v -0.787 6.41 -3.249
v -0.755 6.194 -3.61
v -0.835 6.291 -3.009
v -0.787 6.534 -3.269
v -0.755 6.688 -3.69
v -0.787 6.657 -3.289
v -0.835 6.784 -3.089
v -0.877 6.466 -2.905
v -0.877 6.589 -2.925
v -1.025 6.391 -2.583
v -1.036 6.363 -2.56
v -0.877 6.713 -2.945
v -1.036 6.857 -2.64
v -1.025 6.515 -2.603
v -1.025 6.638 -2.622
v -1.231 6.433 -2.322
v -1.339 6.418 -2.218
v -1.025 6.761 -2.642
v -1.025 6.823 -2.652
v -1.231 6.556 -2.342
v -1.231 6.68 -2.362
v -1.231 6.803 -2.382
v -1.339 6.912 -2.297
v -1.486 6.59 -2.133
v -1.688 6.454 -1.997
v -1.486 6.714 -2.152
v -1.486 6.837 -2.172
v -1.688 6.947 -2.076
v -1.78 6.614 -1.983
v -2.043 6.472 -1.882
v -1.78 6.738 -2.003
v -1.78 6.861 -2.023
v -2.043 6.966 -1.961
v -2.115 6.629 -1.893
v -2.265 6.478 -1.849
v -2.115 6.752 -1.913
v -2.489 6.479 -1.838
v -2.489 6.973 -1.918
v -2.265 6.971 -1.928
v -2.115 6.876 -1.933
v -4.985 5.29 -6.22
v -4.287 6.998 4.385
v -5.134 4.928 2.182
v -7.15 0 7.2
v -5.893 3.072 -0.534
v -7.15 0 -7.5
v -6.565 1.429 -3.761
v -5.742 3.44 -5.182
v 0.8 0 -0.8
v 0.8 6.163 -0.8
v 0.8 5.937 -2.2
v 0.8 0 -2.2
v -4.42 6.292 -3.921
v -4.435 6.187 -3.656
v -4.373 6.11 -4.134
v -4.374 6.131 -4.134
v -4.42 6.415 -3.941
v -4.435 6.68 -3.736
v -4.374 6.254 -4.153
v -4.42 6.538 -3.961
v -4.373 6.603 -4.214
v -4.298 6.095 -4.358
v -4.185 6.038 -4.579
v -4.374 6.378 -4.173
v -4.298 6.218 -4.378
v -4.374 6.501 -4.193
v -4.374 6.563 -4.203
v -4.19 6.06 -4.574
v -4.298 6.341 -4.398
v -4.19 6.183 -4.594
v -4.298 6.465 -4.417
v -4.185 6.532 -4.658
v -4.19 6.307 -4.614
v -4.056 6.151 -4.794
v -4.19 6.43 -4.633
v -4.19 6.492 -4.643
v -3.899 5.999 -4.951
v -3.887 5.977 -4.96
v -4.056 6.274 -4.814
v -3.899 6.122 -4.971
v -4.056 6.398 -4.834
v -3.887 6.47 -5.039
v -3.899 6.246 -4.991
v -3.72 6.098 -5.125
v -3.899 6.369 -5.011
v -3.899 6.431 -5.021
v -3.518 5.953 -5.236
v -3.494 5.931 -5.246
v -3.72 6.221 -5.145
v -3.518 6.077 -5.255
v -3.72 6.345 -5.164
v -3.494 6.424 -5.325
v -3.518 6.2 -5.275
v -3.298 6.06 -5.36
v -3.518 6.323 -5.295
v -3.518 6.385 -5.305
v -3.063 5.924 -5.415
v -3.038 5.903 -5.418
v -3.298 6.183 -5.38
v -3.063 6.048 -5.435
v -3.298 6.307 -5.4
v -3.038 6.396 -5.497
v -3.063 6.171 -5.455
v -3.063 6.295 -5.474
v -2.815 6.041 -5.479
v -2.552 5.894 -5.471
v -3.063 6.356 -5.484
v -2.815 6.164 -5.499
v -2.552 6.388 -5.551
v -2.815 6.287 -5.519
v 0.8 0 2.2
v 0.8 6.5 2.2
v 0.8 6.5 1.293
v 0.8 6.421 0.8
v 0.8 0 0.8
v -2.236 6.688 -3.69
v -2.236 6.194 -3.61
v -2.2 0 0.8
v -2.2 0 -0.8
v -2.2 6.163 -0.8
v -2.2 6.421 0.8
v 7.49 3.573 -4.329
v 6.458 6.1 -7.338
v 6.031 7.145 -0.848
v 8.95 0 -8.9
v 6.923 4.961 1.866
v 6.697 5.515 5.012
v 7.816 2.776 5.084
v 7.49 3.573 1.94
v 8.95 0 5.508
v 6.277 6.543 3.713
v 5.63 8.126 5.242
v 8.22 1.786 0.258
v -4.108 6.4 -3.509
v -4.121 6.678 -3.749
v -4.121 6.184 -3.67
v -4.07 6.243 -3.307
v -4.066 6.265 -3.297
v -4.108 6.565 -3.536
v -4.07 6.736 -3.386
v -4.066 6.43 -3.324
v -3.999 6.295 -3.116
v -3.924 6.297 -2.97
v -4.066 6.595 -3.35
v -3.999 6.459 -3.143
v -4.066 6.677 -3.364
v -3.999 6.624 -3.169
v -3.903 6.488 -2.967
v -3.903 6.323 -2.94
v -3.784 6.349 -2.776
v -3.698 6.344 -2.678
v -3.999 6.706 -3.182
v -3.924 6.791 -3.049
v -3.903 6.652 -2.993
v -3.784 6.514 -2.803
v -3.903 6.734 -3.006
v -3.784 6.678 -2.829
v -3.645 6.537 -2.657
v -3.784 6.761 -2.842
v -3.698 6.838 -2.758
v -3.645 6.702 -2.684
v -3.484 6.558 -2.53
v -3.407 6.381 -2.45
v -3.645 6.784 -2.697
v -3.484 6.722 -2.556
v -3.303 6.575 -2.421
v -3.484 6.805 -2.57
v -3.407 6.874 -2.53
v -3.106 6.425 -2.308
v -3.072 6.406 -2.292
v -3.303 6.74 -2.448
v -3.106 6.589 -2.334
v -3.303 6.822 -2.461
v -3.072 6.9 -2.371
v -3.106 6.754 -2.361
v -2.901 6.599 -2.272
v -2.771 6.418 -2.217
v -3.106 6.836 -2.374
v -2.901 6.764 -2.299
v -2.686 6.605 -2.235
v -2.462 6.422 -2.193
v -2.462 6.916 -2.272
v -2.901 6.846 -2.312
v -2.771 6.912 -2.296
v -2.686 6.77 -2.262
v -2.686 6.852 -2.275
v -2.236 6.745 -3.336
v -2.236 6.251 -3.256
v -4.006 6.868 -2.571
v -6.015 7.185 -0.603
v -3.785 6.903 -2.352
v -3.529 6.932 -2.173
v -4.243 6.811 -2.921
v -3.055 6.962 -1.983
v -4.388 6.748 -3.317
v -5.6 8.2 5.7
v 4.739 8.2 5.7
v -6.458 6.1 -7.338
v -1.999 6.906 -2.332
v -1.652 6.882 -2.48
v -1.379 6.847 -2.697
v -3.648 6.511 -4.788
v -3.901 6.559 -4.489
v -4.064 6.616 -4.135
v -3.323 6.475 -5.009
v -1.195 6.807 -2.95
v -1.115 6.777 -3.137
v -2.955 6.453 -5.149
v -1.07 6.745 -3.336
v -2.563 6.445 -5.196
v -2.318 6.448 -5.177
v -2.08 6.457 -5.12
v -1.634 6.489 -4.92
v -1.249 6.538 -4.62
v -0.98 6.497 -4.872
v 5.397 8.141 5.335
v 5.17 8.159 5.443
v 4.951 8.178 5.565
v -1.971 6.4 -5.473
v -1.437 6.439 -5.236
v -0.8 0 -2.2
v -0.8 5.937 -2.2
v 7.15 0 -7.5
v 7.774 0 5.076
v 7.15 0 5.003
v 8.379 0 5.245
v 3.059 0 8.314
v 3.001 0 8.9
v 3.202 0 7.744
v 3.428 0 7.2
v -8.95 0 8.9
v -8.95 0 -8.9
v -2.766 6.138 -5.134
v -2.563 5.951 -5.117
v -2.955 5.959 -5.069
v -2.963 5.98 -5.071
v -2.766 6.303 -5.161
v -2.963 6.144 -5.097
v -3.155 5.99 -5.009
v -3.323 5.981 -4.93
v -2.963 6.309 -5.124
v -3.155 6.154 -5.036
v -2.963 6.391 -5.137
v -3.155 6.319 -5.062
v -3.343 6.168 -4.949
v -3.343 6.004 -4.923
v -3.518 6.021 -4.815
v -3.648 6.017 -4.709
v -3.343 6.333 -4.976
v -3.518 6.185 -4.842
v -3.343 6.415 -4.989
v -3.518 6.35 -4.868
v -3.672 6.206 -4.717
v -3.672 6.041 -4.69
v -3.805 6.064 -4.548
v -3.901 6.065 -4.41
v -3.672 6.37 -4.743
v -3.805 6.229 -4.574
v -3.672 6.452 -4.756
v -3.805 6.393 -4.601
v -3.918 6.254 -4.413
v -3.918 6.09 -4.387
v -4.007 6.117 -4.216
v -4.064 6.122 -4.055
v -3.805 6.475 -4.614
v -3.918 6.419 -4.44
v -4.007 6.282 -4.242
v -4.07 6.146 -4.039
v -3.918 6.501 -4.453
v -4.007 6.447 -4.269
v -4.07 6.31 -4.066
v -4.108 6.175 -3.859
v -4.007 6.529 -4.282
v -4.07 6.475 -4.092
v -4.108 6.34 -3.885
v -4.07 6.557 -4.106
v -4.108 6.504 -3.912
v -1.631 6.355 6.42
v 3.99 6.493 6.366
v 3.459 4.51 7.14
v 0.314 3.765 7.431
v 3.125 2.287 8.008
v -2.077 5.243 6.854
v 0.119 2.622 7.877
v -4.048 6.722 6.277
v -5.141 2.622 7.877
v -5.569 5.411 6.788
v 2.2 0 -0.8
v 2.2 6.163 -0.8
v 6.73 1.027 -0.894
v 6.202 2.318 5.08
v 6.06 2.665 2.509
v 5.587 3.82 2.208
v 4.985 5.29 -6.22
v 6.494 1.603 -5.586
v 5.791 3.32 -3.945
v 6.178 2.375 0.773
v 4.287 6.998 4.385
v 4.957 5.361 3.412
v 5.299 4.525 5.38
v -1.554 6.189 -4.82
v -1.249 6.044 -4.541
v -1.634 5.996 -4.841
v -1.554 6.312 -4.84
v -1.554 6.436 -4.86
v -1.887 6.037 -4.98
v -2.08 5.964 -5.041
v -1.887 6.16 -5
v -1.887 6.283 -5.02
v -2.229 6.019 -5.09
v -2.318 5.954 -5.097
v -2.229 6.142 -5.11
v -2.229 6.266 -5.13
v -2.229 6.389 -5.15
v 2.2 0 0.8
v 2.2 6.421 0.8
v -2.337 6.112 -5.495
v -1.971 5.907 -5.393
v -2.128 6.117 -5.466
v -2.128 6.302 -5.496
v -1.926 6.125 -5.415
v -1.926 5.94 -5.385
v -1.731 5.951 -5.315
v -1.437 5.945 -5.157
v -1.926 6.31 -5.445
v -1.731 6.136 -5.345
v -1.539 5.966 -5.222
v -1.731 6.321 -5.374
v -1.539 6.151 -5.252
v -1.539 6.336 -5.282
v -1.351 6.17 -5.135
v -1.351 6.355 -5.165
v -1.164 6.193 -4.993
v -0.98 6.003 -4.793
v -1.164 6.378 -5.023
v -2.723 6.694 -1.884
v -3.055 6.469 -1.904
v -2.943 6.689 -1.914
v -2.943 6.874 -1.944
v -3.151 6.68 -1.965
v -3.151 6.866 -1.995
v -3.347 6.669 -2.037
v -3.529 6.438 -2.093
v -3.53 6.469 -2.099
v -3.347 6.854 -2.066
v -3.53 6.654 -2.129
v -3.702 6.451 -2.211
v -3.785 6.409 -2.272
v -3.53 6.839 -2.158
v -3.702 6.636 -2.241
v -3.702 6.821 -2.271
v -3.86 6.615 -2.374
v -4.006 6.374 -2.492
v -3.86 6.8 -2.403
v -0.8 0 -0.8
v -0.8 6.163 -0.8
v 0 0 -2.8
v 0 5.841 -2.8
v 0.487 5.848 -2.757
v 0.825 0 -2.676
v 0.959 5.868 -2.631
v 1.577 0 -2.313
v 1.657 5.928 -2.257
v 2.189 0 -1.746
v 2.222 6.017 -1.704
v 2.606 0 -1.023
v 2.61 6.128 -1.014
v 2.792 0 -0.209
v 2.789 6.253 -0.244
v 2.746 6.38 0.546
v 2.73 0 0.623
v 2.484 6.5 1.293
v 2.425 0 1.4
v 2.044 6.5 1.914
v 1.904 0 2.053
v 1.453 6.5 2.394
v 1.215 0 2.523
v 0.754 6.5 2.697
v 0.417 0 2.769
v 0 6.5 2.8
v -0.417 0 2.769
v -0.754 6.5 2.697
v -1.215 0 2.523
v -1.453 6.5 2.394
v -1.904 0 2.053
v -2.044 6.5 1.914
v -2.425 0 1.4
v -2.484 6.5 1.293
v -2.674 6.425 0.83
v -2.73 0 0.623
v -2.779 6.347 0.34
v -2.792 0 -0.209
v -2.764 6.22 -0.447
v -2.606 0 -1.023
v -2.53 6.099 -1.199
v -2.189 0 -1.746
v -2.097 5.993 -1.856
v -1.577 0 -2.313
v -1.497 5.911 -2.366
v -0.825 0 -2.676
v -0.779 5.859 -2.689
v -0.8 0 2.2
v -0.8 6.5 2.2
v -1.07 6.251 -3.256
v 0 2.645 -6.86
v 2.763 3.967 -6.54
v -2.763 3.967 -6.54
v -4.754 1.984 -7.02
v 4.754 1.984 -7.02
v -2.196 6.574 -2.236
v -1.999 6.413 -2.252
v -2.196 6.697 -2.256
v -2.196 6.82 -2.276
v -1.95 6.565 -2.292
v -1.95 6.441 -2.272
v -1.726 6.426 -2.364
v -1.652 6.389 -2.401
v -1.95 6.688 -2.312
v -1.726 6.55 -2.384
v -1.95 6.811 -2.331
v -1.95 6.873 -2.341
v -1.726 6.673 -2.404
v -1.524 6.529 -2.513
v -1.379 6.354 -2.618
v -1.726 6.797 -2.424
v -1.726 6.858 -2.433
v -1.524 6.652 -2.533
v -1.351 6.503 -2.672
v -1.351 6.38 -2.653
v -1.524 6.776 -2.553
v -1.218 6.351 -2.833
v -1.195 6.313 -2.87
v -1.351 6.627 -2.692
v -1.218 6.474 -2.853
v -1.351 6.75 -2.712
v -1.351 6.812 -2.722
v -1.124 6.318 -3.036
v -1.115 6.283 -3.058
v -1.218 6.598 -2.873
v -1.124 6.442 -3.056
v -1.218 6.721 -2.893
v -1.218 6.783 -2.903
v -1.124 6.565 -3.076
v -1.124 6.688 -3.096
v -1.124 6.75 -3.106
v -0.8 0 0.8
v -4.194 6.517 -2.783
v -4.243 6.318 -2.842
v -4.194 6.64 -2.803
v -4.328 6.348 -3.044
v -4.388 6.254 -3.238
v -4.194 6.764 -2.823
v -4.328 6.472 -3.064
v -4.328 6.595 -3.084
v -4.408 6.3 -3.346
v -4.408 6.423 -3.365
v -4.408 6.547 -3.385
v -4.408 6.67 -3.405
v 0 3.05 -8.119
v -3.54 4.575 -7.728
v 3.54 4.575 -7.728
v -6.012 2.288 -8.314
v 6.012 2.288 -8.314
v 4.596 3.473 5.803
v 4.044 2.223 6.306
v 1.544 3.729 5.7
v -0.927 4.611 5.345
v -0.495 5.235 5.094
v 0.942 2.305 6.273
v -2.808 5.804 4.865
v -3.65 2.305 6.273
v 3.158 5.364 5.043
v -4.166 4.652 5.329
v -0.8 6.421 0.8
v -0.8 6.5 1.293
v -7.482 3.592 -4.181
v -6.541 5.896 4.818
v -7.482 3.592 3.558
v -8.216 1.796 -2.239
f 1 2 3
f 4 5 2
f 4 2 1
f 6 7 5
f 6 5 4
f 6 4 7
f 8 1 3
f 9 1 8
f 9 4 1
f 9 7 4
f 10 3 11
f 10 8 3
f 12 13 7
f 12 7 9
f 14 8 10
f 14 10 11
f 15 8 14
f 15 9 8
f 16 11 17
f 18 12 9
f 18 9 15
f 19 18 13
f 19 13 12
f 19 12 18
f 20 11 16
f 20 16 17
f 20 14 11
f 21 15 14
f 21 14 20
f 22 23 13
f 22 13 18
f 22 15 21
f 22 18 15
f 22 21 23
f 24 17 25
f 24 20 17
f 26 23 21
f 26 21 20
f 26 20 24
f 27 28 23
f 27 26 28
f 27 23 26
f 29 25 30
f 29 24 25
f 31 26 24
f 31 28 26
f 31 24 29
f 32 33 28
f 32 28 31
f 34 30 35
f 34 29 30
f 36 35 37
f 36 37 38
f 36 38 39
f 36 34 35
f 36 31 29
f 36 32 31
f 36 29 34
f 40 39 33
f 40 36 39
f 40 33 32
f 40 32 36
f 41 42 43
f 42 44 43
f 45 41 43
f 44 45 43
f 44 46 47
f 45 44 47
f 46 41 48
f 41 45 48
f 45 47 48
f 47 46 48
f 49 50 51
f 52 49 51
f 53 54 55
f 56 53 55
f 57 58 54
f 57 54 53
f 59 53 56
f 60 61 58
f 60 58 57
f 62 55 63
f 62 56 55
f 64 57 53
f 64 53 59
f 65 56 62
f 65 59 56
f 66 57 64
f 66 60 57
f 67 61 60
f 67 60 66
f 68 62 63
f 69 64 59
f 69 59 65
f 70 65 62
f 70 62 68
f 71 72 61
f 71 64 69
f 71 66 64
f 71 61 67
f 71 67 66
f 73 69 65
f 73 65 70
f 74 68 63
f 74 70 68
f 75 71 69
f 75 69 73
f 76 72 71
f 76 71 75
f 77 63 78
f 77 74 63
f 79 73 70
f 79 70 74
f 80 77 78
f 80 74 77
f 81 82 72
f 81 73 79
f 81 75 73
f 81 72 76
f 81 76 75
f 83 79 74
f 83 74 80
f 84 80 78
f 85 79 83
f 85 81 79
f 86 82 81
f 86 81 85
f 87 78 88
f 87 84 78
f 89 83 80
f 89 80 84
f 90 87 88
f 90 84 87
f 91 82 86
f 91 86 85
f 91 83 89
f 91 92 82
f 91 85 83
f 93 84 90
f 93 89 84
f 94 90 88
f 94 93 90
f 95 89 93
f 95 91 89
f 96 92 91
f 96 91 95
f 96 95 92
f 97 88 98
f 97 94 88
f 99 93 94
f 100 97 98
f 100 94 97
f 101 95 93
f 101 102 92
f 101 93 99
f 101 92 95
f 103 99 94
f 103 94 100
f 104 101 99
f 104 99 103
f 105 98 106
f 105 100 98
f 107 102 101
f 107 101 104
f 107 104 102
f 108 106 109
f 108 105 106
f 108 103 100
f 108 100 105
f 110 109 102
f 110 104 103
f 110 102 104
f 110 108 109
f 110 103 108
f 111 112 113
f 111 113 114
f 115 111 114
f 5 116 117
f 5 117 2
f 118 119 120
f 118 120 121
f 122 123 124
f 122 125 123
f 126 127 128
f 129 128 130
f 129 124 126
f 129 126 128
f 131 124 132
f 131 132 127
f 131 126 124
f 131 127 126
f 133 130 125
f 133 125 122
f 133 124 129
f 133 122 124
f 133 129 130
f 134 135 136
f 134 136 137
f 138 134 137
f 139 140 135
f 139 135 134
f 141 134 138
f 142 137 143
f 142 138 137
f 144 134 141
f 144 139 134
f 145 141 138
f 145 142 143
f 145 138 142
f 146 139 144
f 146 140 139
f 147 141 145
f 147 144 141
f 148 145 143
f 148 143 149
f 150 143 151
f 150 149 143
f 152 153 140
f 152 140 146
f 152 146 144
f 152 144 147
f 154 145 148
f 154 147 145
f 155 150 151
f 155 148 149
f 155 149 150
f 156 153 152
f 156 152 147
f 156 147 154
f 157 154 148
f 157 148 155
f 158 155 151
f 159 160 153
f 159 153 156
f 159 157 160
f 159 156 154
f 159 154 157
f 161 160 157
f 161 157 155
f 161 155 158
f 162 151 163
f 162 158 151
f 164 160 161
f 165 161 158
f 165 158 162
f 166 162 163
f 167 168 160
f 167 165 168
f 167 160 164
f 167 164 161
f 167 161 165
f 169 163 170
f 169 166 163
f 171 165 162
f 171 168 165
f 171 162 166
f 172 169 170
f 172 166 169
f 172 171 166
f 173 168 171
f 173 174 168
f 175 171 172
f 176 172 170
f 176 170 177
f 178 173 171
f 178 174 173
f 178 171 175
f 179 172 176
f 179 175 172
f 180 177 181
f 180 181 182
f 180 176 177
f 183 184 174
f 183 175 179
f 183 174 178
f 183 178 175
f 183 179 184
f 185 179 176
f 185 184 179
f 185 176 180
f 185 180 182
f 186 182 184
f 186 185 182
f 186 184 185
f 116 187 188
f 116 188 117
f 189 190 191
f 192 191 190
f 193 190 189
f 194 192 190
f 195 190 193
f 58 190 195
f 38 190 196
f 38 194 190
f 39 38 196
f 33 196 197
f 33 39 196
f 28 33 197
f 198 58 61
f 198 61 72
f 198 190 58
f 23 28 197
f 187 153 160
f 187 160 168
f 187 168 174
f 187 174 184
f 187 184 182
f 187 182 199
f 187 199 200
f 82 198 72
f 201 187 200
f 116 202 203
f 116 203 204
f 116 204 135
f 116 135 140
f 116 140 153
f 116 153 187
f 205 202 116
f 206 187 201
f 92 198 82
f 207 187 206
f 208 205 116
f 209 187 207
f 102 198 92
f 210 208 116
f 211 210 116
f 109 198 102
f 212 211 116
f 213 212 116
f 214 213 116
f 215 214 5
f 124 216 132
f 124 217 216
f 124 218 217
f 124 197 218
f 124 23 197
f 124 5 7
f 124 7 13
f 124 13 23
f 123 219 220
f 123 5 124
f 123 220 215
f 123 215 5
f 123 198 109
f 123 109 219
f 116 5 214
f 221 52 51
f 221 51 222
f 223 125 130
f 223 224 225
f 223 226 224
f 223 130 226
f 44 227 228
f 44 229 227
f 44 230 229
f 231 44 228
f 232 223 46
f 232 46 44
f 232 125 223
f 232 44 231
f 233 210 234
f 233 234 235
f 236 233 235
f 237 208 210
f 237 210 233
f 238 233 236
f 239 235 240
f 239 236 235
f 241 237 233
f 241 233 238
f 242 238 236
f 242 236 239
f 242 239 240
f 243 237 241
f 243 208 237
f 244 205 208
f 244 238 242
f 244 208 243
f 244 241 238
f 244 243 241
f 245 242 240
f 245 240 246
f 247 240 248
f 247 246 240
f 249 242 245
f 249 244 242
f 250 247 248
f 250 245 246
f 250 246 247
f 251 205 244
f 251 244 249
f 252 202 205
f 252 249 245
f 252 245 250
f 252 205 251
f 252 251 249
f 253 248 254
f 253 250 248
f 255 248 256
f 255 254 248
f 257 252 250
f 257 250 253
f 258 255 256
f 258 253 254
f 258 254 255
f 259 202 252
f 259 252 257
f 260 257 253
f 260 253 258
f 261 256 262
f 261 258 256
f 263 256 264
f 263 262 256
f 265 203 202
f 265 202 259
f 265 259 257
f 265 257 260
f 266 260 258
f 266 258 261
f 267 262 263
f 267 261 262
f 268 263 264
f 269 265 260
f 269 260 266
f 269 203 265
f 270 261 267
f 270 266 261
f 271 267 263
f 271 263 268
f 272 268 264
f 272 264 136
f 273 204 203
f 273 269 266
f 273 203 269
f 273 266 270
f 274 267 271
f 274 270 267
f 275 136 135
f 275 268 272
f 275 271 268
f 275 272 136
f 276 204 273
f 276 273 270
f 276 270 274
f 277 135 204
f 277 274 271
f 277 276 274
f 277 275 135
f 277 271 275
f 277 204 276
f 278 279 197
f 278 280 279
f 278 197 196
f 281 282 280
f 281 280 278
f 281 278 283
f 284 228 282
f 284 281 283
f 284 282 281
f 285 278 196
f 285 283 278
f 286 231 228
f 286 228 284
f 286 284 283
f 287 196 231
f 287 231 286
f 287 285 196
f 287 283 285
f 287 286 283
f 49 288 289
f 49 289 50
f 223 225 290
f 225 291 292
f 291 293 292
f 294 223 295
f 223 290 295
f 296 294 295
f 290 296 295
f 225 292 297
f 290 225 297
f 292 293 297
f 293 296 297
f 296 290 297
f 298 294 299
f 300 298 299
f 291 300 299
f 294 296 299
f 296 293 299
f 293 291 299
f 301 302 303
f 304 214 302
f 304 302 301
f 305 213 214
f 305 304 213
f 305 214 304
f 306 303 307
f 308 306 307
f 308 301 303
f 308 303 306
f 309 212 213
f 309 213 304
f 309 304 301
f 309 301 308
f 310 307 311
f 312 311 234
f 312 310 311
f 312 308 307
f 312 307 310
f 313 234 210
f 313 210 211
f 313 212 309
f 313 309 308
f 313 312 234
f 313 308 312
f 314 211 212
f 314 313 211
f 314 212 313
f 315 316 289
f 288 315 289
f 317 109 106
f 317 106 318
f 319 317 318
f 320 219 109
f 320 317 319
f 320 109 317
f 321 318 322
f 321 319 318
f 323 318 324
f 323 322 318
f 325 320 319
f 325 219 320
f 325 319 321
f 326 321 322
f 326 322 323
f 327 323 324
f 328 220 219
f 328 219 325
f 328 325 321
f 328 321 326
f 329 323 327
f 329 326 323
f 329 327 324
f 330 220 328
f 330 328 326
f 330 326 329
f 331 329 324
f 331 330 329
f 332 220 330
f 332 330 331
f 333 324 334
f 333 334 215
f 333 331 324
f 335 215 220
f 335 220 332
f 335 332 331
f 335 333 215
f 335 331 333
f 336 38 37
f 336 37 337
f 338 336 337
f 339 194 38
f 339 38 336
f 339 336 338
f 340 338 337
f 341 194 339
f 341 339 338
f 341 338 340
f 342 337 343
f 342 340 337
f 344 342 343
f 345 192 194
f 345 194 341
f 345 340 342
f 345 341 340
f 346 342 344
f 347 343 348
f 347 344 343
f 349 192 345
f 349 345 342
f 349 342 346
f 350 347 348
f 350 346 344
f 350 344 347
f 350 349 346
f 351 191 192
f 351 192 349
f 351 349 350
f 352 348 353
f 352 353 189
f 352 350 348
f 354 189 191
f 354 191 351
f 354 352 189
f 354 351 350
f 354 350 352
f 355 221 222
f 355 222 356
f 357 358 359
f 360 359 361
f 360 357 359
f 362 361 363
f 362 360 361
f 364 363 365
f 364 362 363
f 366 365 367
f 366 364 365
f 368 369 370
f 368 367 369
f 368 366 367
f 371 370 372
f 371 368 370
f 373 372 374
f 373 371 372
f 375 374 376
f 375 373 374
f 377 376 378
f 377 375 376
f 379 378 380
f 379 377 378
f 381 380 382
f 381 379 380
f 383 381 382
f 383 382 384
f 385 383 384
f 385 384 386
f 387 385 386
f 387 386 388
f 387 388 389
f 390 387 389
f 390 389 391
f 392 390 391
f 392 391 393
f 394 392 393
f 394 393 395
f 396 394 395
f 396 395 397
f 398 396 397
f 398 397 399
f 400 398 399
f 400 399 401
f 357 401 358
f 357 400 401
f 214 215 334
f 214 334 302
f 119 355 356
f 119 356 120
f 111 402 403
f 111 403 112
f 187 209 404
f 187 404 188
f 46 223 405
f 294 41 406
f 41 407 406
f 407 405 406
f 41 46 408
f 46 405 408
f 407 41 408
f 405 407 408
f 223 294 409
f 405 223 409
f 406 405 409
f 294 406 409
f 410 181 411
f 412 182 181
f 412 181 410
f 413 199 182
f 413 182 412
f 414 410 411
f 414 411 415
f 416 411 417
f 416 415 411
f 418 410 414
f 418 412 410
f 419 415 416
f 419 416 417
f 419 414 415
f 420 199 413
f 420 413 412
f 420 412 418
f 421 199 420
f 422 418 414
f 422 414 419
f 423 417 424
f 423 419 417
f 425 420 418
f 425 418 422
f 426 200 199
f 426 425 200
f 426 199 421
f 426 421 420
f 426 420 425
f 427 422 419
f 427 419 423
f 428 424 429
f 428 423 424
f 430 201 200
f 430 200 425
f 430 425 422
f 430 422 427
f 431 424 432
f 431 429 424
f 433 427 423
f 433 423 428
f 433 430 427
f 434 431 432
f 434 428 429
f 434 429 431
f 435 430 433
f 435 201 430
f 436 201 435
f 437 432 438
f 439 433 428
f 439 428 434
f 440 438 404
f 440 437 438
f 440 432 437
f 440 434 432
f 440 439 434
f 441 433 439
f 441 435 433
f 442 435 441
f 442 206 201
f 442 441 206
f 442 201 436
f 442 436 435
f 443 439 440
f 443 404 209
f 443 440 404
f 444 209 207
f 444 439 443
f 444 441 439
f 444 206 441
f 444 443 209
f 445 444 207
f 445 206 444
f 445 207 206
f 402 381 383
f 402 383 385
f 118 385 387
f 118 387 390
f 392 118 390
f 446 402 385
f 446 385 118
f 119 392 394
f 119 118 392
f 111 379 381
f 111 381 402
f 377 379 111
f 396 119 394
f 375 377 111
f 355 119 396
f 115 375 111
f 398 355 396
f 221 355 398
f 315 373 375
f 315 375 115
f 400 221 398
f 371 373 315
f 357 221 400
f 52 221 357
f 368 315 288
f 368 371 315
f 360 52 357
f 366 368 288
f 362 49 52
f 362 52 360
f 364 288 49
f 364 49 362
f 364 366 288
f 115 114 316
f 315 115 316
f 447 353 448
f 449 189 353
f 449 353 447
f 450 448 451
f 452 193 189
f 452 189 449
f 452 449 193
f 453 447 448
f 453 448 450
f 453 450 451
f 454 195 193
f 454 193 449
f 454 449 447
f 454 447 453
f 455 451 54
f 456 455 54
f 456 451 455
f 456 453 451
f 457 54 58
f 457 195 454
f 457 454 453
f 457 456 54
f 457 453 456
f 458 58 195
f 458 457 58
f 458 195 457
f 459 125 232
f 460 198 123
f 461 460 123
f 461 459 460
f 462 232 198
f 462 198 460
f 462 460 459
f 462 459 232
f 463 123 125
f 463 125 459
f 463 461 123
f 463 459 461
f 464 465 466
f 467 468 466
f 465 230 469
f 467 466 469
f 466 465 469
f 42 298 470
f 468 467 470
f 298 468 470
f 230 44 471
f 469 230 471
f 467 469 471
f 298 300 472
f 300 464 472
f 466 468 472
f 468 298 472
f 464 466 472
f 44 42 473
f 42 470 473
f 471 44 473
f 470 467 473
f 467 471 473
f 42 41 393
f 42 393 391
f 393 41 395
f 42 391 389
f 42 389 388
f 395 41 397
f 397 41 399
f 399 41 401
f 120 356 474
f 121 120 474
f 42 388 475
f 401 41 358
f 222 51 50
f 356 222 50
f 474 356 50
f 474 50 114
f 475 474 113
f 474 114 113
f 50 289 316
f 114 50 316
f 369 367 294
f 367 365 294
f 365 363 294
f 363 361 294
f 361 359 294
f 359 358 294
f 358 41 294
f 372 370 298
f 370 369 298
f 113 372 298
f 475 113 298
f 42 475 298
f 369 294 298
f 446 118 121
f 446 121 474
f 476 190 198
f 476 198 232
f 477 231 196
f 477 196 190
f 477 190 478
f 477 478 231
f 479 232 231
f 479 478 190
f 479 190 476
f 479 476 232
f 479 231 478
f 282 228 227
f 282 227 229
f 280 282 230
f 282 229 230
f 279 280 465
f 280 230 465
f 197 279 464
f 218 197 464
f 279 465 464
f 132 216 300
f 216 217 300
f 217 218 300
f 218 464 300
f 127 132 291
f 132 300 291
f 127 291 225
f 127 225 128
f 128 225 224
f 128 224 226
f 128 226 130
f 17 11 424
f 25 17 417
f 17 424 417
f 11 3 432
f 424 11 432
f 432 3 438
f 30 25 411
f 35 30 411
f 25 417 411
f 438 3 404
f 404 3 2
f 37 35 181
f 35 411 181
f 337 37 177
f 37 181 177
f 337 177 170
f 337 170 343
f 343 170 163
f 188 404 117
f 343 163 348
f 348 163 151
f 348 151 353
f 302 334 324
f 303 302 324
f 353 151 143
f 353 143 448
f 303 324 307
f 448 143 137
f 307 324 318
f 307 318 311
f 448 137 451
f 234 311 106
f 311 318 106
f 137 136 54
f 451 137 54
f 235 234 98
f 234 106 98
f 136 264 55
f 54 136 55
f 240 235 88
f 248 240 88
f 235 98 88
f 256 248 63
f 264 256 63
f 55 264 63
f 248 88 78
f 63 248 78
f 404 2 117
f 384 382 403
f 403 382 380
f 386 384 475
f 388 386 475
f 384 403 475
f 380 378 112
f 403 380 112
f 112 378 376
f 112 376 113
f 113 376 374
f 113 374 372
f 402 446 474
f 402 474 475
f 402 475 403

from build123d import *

# Parameters (mm, degrees)
OTHER_START         = 7.189240539
OTHER_2_OUTLINE_W   = 16
OTHER_2_OUTLINE_H   = 16
OTHER_2_DEPTH       = 1.9877561
SKETCH_20_R         = 2.8
EXTRUDE_2_DEPTH     = 6.5
SKETCH_22_R         = 4
CUT_EXTRUDE_2_DEPTH = 9
CUT_EXTRUDE_3_DEPTH = 0.5


# Read off the part's stored shape, not the designer's step: 相交2
with BuildPart() as part:
    # 草图4 → Loft 1 section 0
    with BuildSketch(Plane(origin=(0, 8.2, 0), x_dir=(1, 0, 0), z_dir=(0, 1, 0))):
        with BuildLine():
            Line((-5.6, 6.8), (5.6, 6.8))
            Line((5.6, 6.8), (5.6, -5.7))
            Line((5.6, -5.7), (-5.6, -5.7))
            Line((-5.6, -5.7), (-5.6, 6.8))
        make_face()
    # 草图1 → Loft 1 section 1
    with BuildSketch(Plane(origin=(0, 0, 0), x_dir=(1, 0, 0), z_dir=(0, 1, 0))):
        with BuildLine():
            Line((-8.95, -8.9), (8.95, -8.9))
            Line((8.95, -8.9), (8.95, 8.9))
            Line((8.95, 8.9), (-8.95, 8.9))
            Line((-8.95, 8.9), (-8.95, -8.9))
        make_face()
    loft()

    # 相交2 outline → 相交2 (cut)
    with BuildSketch(Plane(origin=(0, 0, 0), x_dir=(1, 0, 0), z_dir=(0, 0.9872752829851917, -0.15902048800865198)).offset(OTHER_START)):
        Rectangle(OTHER_2_OUTLINE_W, OTHER_2_OUTLINE_H)
    extrude(amount=OTHER_2_DEPTH, mode=Mode.SUBTRACT)

    # 草图19 → Loft 1 2 section 0
    with BuildSketch(Plane(origin=(0, 6.132664073, -0.987788564), x_dir=(1, 0, 0), z_dir=(0, 0.9872752829851916, -0.15902048800865207))):
        with BuildLine():
            Line((-4.985089723, 5.299749211), (4.985089723, 5.299749211))
            Line((4.985089723, 5.299749211), (4.287230721, -5.442213697))
            Line((4.287230721, -5.442213697), (-4.287230721, -5.442213697))
            Line((-4.287230721, -5.442213697), (-4.985089723, 5.299749211))
        make_face()
    # 草图8 → Loft 1 2 section 1
    with BuildSketch(Plane.XZ):
        with BuildLine():
            Line((-7.15, 7.2), (7.15, 7.2))
            Line((7.15, 7.2), (7.15, -7.5))
            Line((7.15, -7.5), (-7.15, -7.5))
            Line((-7.15, -7.5), (-7.15, 7.2))
        make_face()
    loft(mode=Mode.SUBTRACT)

    # 草图20 → 凸台-拉伸2 (add)
    with BuildSketch(Plane.XZ):
        with Locations(Location((0, 0, 0), (0, 0, 270))):
            Circle(SKETCH_20_R)
        Polygon((-2.2, 0.8), (-0.8, 0.8), (-0.8, 2.2), (0.8, 2.2), (0.8, 0.8), (2.2, 0.8), (2.2, -0.8), (0.8, -0.8), (0.8, -2.2), (-0.8, -2.2), (-0.8, -0.8), (-2.2, -0.8), align=None, mode=Mode.SUBTRACT)
    extrude(amount=-EXTRUDE_2_DEPTH)

    # 草图22 → 切除-拉伸2 (cut)
    with BuildSketch(Plane.XZ):
        with Locations((7, 9)):
            Circle(SKETCH_22_R)
    extrude(amount=-CUT_EXTRUDE_2_DEPTH, mode=Mode.SUBTRACT)

    # 草图23 → 切除-拉伸3 (cut)
    with BuildSketch(Plane(origin=(0, 7.097759487, -1.143236539), x_dir=(1, 0, 0), z_dir=(0, 0.9872752829851916, -0.15902048800865207))):
        with BuildLine():
            Line((-0.979801877, 3.777052641), (-1.249032646, 3.521844308))
            add(Edge.make_bspline(
                [(-1.249032646, 3.521844308), (-1.297751534, 3.567675171), (-1.39402758, 3.658244034), (-1.550987823, 3.775755029), (-1.714751457, 3.876421129), (-1.884463954, 3.958327366), (-2.055922508, 4.023680126), (-2.226851284, 4.070208266), (-2.395496985, 4.099880804), (-2.507664204, 4.103429173), (-2.562934889, 4.105177641)],
                knots=[0, 0, 0, 0, 1.08915593, 2.152340314, 3.188132944, 4.216796309, 5.218260357, 6.173443236, 7.099959455, 8, 8, 8, 8], degree=3))
            add(Edge.make_bspline(
                [(-2.562934889, 4.105177641), (-2.596849589, 4.104764035), (-2.66459103, 4.103937896), (-2.765212974, 4.093393681), (-2.864779611, 4.078228817), (-2.963102986, 4.056286939), (-3.060374272, 4.02847788), (-3.156255164, 3.993692417), (-3.250924519, 3.953137172), (-3.3434906, 3.906274699), (-3.433231104, 3.854794852), (-3.517987939, 3.797746312), (-3.598301338, 3.736957522), (-3.672661763, 3.670906542), (-3.74149695, 3.600191677), (-3.806445322, 3.526128371), (-3.865222618, 3.446693152), (-3.918313783, 3.363347526), (-3.965675401, 3.277555337), (-4.007484055, 3.190142347), (-4.042581143, 3.101398493), (-4.070350598, 3.011212415), (-4.093261252, 2.920281825), (-4.109378859, 2.827977105), (-4.118465582, 2.73419942), (-4.120037361, 2.671402161), (-4.120827518, 2.63983309)],
                knots=[0, 0, 0, 0, 1.02818874, 2.053710826, 3.065248034, 4.081641283, 5.106893873, 6.131558223, 7.173050175, 8.228653731, 9.27666206, 10.308777013, 11.325269123, 12.329503258, 13.32196095, 14.316845687, 15.314881793, 16.315733098, 17.311955233, 18.285320748, 19.252783886, 20.203351036, 21.145449891, 22.095197417, 23.042428769, 24, 24, 24, 24], degree=3))
            add(Edge.make_bspline(
                [(-4.120827518, 2.63983309), (-4.120071799, 2.607562273), (-4.118562426, 2.543108759), (-4.108902107, 2.446914687), (-4.090973866, 2.352149284), (-4.067006157, 2.258501151), (-4.037025342, 2.165809903), (-3.999652676, 2.074477393), (-3.955387075, 1.984507002), (-3.904150523, 1.896709385), (-3.84796432, 1.811186362), (-3.785021239, 1.73062684), (-3.718160655, 1.653958063), (-3.644946755, 1.582882299), (-3.567727213, 1.515498403), (-3.484194937, 1.453662881), (-3.395992477, 1.396184658), (-3.302985265, 1.343788138), (-3.206182482, 1.296979603), (-3.106925729, 1.255355706), (-3.004897914, 1.221076369), (-2.900635224, 1.193138265), (-2.794261952, 1.170237968), (-2.68523815, 1.155505488), (-2.574365441, 1.144814657), (-2.499626809, 1.144032987), (-2.461973351, 1.14363918)],
                knots=[0, 0, 0, 0, 0.93586088, 1.869166235, 2.799637598, 3.729985548, 4.670839027, 5.622275134, 6.589130586, 7.576015415, 8.568469353, 9.55398029, 10.53834874, 11.515998671, 12.510579167, 13.508179873, 14.527009472, 15.561807829, 16.601455013, 17.643573243, 18.680854198, 19.719860599, 20.772568776, 21.833555941, 22.908541556, 24, 24, 24, 24], degree=3))
            add(Edge.make_bspline(
                [(-2.461973351, 1.14363918), (-2.416595004, 1.144587756), (-2.327487246, 1.14645044), (-2.196500804, 1.160950729), (-2.070697733, 1.183597523), (-1.95043153, 1.21676342), (-1.835562509, 1.259067095), (-1.725669568, 1.310062481), (-1.621617909, 1.37170554), (-1.523094735, 1.441279407), (-1.43233755, 1.51879424), (-1.350483426, 1.602438695), (-1.278837937, 1.691806762), (-1.216333237, 1.786372077), (-1.164624583, 1.886917382), (-1.122181788, 1.992949944), (-1.089648496, 2.104517456), (-1.076293522, 2.181609088), (-1.069545466, 2.220562257)],
                knots=[0, 0, 0, 0, 1.13008108, 2.219097802, 3.278683437, 4.311054135, 5.322181354, 6.324827112, 7.324222904, 8.330512327, 9.32562643, 10.293043162, 11.24128371, 12.174520618, 13.111833804, 14.052305215, 15.015860969, 16, 16, 16, 16], degree=3))
            Line((-1.069545466, 2.220562257), (-2.236212133, 2.220562257))
            Line((-2.236212133, 2.220562257), (-2.236212133, 2.579536616))
            Line((-2.236212133, 2.579536616), (-0.755442902, 2.579536616))
            add(Edge.make_bspline(
                [(-0.755442902, 2.579536616), (-0.757148751, 2.512629127), (-0.760487404, 2.381679085), (-0.78390632, 2.190708814), (-0.821722832, 2.010337121), (-0.873383144, 1.840374049), (-0.940258424, 1.681060457), (-1.021630952, 1.53223459), (-1.118803074, 1.39485791), (-1.228313515, 1.267808906), (-1.351213473, 1.154479694), (-1.484182093, 1.054873756), (-1.627439061, 0.970971141), (-1.780848869, 0.902710478), (-1.943909302, 0.849436483), (-2.116997682, 0.811664907), (-2.299879283, 0.789034943), (-2.425215959, 0.786143564), (-2.489317101, 0.784664821)],
                knots=[0, 0, 0, 0, 1.140356446, 2.231883559, 3.274166699, 4.278491846, 5.25512956, 6.21435461, 7.1637429, 8.11826594, 9.068280886, 10.0076534, 10.945064095, 11.891975133, 12.864533718, 13.863980011, 14.907571808, 16, 16, 16, 16], degree=3))
            add(Edge.make_bspline(
                [(-2.489317101, 0.784664821), (-2.528827236, 0.785233942), (-2.606753957, 0.786356433), (-2.721844885, 0.79433378), (-2.833762506, 0.806614356), (-2.942490515, 0.82515948), (-3.048428857, 0.847874134), (-3.151048442, 0.876960853), (-3.250740184, 0.910629552), (-3.347658169, 0.948925226), (-3.440922716, 0.993296882), (-3.530949233, 1.042606522), (-3.618235359, 1.096599882), (-3.702186524, 1.156210728), (-3.783240145, 1.220993188), (-3.860873589, 1.291077107), (-3.935521467, 1.366248227), (-3.982281931, 1.419627237), (-4.005843543, 1.446523795)],
                knots=[0, 0, 0, 0, 1.107784379, 2.184907829, 3.233506516, 4.263428166, 5.276301166, 6.270063455, 7.25232949, 8.225834625, 9.190232166, 10.146266622, 11.1027726, 12.066435141, 13.031522626, 14.010570082, 14.99756817, 16, 16, 16, 16], degree=3))
            add(Edge.make_bspline(
                [(-4.005843543, 1.446523795), (-4.040029475, 1.489194448), (-4.107833888, 1.573827465), (-4.195112044, 1.70942741), (-4.269513447, 1.84982927), (-4.329881269, 1.995423898), (-4.377019356, 2.146075111), (-4.410825608, 2.301590402), (-4.430632898, 2.462170033), (-4.433486435, 2.570835298), (-4.434930082, 2.625810654)],
                knots=[0, 0, 0, 0, 1.023165419, 2.029347347, 3.013907458, 3.994755782, 4.975994455, 5.96558838, 6.970761222, 8, 8, 8, 8], degree=3))
            add(Edge.make_bspline(
                [(-4.434930082, 2.625810654), (-4.434397844, 2.666976907), (-4.433340132, 2.748786214), (-4.420514615, 2.870243522), (-4.402113197, 2.989544214), (-4.375066143, 3.10659077), (-4.340969878, 3.221461362), (-4.298416392, 3.334209326), (-4.248871496, 3.444901197), (-4.191286, 3.552775065), (-4.127201541, 3.656399478), (-4.05765132, 3.755357282), (-3.98164772, 3.847846347), (-3.90043192, 3.935037995), (-3.81303493, 4.015836842), (-3.720275507, 4.090990953), (-3.622082164, 4.160601138), (-3.518145984, 4.223570973), (-3.410018299, 4.280134594), (-3.297958298, 4.329723805), (-3.182000187, 4.370707121), (-3.063012709, 4.4054809), (-2.940095209, 4.431196041), (-2.814139672, 4.449844786), (-2.68448956, 4.462605386), (-2.59685353, 4.463631642), (-2.552418062, 4.464152)],
                knots=[0, 0, 0, 0, 1.008945113, 2.00506715, 2.99143336, 3.967273523, 4.948097931, 5.927297278, 6.919902385, 7.919676788, 8.923139349, 9.905703106, 10.883022732, 11.856032218, 12.825136022, 13.798837087, 14.781400844, 15.773989409, 16.776158564, 17.77167057, 18.775803737, 19.789618931, 20.80898985, 21.851988756, 22.910860228, 24, 24, 24, 24], degree=3))
            add(Edge.make_bspline(
                [(-2.552418062, 4.464152), (-2.516179819, 4.463572509), (-2.44432364, 4.462423445), (-2.337397908, 4.454458797), (-2.232124893, 4.441834915), (-2.128348503, 4.424608129), (-2.026422137, 4.401144438), (-1.926055432, 4.373066154), (-1.827102895, 4.340374331), (-1.729874646, 4.301385485), (-1.63371693, 4.25713186), (-1.53809509, 4.207318437), (-1.443335844, 4.151093433), (-1.349274862, 4.088289897), (-1.255319004, 4.019986479), (-1.162954362, 3.944229656), (-1.069951418, 3.8640069), (-1.010149603, 3.806324716), (-0.979801877, 3.777052641)],
                knots=[0, 0, 0, 0, 0.985871117, 1.954866573, 2.915460327, 3.869826059, 4.81536089, 5.759505086, 6.70452669, 7.649098992, 8.607881297, 9.583363685, 10.581137262, 11.603961102, 12.659522466, 13.73993555, 14.853081303, 16, 16, 16, 16], degree=3))
        make_face()
    extrude(amount=-CUT_EXTRUDE_3_DEPTH, mode=Mode.SUBTRACT)


solid = part.part
